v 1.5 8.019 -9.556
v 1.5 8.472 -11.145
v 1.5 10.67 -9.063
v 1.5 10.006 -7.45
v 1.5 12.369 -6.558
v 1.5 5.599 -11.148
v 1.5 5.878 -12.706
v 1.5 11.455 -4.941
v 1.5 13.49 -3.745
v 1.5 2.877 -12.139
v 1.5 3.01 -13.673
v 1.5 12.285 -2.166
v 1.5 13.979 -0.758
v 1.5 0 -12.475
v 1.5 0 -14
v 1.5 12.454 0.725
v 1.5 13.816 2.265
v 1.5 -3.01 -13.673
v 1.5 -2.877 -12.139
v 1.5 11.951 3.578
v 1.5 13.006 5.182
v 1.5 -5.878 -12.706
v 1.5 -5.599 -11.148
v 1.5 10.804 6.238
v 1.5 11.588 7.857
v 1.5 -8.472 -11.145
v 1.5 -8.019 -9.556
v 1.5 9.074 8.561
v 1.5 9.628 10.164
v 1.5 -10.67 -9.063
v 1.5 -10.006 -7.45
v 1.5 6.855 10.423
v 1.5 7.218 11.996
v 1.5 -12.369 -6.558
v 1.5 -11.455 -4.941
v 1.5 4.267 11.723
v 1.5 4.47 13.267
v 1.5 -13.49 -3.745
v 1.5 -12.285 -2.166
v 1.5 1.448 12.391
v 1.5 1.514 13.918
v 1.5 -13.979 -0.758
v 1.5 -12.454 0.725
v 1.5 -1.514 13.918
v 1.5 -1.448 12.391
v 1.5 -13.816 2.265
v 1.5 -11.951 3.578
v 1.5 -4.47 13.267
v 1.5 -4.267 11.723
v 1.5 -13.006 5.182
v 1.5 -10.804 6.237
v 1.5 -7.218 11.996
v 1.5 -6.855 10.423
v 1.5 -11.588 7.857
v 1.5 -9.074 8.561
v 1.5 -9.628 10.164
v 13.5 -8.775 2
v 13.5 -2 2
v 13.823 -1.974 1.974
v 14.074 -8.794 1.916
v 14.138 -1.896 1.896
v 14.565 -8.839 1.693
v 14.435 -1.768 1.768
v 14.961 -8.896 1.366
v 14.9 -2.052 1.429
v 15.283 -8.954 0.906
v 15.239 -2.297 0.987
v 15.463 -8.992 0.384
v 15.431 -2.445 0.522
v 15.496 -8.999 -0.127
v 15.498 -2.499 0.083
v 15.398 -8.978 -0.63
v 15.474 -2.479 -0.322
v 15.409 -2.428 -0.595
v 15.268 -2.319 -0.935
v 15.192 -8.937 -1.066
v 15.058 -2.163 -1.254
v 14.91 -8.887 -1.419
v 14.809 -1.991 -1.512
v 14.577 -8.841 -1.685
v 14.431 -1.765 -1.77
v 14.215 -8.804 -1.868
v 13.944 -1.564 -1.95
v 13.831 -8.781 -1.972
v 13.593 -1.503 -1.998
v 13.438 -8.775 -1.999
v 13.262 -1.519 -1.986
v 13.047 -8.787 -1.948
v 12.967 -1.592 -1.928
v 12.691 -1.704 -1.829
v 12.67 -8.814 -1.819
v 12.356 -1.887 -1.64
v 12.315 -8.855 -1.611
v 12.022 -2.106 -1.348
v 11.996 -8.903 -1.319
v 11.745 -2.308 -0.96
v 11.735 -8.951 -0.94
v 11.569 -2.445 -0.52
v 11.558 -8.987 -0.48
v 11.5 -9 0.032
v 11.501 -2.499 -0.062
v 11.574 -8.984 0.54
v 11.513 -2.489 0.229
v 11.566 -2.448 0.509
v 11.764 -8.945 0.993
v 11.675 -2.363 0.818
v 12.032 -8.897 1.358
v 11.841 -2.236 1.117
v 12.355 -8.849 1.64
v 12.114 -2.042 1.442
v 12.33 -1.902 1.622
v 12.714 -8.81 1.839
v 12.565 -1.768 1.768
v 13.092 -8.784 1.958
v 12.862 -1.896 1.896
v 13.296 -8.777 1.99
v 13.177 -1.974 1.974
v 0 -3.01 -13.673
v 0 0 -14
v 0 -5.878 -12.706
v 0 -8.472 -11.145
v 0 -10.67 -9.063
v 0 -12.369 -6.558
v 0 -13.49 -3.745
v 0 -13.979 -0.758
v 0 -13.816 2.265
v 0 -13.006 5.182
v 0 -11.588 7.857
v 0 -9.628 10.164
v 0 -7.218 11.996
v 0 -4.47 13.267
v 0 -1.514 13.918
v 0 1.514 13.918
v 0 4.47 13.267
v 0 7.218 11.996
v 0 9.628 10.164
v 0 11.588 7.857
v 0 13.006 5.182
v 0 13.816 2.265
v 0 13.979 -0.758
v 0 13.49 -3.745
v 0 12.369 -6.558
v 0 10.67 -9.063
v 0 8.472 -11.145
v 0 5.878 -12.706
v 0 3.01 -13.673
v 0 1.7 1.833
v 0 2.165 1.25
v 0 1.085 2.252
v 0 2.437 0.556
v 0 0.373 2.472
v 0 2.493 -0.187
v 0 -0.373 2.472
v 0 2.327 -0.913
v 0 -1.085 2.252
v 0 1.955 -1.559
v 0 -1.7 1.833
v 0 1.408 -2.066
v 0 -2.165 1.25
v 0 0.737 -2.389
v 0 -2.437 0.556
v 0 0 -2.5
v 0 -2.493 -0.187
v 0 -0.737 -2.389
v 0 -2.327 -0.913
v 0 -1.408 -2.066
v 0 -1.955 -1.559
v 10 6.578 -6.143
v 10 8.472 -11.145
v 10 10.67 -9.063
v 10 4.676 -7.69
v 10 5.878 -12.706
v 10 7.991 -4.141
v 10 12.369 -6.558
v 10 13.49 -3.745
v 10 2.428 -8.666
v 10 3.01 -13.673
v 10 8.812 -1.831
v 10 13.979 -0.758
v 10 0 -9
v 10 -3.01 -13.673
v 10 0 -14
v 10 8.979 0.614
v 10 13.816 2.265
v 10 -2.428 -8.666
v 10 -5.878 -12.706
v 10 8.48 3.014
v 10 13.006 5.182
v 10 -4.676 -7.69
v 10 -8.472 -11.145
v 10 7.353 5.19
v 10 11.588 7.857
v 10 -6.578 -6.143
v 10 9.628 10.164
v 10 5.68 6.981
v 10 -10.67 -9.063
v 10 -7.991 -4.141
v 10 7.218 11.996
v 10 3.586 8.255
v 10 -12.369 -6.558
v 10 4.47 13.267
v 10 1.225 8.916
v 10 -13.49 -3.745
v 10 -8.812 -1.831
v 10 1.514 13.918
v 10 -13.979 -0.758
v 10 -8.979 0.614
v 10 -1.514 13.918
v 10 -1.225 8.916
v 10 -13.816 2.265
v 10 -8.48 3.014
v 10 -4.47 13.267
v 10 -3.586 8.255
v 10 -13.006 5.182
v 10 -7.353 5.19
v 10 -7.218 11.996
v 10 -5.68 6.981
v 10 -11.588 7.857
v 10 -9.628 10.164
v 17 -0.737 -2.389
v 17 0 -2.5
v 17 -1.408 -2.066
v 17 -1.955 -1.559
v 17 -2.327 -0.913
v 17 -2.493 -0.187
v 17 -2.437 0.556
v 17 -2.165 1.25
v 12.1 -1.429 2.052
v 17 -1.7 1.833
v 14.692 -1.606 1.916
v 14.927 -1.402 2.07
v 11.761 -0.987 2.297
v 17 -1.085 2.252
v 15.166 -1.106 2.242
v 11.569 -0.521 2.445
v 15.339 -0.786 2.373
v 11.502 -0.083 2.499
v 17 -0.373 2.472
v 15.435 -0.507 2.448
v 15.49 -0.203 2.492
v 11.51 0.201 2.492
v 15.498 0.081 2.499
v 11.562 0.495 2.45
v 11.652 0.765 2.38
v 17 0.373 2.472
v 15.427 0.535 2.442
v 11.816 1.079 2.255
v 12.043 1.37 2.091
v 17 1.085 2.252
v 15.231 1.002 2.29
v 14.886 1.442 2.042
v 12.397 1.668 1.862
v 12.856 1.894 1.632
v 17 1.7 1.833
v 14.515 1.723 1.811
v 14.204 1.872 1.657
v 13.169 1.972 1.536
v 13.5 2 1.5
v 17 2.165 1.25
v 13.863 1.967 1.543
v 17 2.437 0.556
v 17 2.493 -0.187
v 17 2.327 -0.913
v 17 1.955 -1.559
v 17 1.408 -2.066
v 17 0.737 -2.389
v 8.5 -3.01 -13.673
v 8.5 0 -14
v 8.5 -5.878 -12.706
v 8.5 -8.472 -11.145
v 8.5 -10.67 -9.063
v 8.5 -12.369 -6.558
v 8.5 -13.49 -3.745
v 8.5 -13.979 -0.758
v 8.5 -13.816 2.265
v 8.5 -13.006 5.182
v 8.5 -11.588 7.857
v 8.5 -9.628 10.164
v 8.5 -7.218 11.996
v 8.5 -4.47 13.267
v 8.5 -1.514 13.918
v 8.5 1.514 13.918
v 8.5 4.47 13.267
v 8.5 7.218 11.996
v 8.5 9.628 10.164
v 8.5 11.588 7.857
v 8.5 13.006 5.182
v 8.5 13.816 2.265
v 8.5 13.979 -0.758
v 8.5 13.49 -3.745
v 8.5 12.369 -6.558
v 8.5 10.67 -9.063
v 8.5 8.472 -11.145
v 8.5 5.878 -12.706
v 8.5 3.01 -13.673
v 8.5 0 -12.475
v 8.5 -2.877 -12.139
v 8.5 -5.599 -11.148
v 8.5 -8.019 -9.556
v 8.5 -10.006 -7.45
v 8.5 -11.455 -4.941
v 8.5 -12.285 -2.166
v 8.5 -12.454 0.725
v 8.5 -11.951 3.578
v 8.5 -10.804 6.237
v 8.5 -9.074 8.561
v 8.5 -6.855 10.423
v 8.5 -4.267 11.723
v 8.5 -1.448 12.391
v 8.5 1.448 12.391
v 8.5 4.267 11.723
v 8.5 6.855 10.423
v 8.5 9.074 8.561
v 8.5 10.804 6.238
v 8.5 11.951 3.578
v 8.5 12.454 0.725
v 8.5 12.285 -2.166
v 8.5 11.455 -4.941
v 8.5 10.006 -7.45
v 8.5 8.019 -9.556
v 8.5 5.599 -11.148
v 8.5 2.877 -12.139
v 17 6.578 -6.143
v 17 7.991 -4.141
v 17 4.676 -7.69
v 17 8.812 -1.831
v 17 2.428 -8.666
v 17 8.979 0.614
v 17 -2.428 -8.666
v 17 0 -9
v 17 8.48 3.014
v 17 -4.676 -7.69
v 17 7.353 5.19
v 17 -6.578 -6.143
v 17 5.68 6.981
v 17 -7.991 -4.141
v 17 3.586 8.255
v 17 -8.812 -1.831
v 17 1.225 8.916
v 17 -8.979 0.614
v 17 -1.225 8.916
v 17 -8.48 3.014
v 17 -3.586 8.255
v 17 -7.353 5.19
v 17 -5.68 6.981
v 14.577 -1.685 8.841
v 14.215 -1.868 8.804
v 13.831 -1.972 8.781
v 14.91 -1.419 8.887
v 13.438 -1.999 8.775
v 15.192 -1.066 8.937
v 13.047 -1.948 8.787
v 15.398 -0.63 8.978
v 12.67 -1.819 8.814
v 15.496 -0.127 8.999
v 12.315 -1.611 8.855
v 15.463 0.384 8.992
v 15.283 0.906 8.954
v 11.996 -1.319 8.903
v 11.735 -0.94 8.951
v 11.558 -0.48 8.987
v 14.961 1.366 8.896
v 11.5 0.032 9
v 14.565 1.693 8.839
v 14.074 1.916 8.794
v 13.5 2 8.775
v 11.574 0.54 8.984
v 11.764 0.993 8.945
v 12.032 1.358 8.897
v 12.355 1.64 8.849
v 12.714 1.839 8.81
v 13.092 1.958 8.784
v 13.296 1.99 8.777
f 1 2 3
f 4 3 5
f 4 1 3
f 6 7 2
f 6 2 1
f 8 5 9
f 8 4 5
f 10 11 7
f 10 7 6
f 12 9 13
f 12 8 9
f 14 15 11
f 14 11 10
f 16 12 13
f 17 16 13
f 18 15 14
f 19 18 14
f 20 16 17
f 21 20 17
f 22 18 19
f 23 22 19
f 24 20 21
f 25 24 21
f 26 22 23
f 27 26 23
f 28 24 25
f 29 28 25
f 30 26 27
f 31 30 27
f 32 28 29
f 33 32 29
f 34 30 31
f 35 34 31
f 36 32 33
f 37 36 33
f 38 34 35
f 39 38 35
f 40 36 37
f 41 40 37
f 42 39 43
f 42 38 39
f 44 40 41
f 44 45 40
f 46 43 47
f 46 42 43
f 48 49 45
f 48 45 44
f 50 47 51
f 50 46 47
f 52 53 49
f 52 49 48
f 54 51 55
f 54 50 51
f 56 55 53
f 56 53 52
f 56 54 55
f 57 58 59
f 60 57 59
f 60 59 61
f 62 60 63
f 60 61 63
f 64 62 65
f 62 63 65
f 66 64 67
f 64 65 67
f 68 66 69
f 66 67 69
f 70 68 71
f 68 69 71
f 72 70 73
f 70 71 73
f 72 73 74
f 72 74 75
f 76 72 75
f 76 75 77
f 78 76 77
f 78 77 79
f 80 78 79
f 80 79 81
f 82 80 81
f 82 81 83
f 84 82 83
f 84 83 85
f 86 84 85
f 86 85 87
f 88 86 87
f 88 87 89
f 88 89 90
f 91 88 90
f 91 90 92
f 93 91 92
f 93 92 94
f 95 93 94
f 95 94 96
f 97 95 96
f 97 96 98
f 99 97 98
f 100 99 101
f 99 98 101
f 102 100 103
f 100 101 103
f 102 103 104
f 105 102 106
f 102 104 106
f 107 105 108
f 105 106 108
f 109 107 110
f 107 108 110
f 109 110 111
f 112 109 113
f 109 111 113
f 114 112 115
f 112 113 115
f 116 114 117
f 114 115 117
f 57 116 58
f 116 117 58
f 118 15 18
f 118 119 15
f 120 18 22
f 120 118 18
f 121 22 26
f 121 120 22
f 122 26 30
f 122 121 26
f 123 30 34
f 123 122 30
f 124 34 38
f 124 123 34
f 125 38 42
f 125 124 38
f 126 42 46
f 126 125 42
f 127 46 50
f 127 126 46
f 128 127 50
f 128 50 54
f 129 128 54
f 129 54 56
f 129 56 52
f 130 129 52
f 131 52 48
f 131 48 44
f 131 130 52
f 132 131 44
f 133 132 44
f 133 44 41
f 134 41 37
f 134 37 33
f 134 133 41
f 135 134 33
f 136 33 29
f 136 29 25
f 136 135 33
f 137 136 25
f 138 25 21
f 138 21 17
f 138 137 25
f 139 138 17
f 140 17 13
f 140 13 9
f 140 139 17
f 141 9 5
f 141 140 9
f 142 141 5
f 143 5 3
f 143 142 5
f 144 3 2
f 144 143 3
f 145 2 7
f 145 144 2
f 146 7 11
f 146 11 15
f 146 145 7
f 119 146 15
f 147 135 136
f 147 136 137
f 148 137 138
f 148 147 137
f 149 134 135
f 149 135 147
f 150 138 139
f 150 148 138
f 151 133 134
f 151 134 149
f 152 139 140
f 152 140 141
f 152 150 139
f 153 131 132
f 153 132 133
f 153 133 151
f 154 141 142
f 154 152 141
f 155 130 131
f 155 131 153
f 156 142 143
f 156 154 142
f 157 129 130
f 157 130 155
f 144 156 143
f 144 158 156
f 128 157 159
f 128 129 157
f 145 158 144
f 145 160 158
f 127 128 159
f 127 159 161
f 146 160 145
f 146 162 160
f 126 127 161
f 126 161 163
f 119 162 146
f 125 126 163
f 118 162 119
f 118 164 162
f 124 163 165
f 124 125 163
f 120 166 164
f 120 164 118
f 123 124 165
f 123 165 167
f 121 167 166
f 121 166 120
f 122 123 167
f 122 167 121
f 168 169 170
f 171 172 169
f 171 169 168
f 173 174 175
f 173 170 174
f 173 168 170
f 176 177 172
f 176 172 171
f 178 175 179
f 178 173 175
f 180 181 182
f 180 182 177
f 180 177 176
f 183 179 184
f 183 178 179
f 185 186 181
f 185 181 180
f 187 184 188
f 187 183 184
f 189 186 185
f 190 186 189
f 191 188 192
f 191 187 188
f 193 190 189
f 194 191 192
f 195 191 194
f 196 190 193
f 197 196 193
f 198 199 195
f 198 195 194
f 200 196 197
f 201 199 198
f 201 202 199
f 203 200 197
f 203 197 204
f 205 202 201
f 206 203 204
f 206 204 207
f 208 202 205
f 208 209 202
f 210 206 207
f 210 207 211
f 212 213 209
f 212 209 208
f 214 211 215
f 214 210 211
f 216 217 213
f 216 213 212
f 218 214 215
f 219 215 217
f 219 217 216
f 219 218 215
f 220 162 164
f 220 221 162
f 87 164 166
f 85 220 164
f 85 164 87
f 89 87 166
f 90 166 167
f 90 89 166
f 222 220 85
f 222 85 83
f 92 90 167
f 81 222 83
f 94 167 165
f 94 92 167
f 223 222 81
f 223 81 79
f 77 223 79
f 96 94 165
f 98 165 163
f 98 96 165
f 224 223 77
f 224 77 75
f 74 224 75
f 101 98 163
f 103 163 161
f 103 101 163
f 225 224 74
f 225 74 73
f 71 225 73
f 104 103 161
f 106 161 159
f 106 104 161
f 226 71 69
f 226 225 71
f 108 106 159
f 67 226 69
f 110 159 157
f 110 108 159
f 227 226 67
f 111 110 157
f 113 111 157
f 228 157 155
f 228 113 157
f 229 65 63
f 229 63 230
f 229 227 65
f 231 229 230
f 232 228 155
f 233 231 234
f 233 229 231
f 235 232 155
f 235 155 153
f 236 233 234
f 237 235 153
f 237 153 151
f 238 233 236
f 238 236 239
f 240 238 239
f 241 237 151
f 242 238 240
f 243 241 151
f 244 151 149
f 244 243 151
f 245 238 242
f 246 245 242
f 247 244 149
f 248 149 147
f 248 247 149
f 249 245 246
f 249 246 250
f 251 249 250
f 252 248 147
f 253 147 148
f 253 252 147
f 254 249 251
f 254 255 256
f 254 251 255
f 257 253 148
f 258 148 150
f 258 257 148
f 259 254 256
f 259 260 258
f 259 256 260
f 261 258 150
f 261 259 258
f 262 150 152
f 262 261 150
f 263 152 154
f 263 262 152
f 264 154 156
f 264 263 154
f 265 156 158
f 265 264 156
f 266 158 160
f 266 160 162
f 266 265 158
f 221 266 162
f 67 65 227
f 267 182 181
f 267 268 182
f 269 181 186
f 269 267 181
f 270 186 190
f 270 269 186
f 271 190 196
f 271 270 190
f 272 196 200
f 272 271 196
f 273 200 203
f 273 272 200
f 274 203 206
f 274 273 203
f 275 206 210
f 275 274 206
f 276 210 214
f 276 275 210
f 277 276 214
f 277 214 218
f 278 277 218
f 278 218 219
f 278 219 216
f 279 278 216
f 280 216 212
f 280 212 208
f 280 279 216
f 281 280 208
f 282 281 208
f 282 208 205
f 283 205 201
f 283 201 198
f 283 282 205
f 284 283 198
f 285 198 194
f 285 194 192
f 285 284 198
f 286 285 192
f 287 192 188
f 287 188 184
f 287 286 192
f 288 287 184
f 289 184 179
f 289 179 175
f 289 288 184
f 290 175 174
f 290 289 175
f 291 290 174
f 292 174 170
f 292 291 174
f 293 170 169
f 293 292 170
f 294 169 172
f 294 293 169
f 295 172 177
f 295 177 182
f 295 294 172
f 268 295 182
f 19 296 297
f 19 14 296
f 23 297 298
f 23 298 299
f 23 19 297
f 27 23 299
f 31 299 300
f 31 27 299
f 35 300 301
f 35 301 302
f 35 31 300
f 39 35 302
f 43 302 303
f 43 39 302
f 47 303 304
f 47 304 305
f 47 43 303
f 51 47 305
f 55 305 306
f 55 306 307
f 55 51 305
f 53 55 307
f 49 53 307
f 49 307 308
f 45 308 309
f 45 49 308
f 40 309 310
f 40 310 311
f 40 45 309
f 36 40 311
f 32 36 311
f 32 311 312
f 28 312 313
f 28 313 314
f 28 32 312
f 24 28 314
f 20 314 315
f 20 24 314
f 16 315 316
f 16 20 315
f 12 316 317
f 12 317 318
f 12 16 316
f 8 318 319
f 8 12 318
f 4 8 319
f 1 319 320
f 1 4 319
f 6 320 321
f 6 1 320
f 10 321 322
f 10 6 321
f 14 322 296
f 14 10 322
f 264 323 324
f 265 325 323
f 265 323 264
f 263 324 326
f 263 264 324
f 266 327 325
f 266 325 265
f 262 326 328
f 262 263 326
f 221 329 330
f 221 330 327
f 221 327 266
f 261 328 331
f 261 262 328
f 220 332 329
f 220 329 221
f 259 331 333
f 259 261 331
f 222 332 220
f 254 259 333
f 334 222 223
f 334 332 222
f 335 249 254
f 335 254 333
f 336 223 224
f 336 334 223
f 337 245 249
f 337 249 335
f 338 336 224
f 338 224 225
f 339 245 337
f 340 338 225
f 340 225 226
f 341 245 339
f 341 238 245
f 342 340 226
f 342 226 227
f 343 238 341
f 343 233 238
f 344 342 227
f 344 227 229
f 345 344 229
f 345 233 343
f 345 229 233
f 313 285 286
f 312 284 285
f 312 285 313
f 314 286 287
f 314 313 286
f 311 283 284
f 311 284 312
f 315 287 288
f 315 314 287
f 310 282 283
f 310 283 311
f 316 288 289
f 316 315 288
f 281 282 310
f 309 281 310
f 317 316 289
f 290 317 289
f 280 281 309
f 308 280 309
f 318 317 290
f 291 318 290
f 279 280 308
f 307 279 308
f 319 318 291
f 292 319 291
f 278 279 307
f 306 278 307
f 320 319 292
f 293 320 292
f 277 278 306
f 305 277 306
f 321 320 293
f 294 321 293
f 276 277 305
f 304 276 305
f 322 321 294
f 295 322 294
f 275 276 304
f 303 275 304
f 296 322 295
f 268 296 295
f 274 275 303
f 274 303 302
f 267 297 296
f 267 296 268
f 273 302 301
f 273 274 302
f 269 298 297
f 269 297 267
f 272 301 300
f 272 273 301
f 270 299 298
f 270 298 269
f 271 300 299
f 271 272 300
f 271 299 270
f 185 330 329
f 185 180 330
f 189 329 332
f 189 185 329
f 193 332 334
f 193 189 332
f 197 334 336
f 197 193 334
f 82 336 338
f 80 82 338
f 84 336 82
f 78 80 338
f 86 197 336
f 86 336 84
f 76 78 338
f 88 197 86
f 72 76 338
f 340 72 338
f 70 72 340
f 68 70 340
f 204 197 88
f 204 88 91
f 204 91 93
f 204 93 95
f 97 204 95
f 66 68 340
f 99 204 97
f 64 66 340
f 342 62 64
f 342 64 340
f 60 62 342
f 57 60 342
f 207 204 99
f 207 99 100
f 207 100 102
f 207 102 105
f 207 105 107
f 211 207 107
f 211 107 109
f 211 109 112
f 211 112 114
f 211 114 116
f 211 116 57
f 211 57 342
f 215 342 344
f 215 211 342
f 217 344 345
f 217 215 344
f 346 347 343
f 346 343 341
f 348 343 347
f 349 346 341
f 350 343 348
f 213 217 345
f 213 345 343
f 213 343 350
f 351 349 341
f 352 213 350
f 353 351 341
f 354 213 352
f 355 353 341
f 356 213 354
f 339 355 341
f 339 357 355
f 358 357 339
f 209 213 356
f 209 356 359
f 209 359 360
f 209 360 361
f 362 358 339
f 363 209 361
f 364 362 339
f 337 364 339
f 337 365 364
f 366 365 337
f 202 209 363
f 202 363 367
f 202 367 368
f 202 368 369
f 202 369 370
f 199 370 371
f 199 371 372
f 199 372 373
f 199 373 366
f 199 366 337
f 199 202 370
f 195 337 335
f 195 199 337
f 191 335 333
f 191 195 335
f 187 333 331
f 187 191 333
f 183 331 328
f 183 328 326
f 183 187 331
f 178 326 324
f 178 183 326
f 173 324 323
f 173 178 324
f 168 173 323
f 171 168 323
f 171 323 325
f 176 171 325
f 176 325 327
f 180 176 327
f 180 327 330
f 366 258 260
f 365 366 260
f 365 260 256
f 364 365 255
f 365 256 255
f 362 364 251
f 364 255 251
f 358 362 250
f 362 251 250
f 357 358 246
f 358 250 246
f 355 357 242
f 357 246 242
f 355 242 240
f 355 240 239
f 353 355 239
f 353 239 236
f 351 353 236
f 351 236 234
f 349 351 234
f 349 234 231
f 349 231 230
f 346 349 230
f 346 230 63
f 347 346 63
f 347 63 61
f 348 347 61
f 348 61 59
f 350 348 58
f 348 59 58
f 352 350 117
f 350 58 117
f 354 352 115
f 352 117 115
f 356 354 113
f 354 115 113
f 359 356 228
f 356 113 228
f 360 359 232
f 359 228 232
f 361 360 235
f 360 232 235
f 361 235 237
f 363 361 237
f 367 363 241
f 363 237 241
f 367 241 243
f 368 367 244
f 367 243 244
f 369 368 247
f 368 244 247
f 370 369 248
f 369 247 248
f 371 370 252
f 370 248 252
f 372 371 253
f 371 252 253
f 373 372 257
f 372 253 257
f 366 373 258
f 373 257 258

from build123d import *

# Parameters (mm, degrees)
CUT_EXTRUDE1_REACH      = 28.096
CUT_EXTRUDE1_END_RADIUS = 9
SKETCH2_R               = 2
CIRPATTERN1_COUNT       = 2
CIRPATTERN1_ANGLE       = 90


with BuildPart() as part:
    # Sketch1 → Revolve1 (revolve)
    with BuildSketch(Plane.XY, mode=Mode.PRIVATE) as revolve1_sk:
        Polygon((0, 2.5), (17, 2.5), (17, 9), (10, 9), (10, 14), (8.5, 14), (8.5, 12.475), (1.5, 12.475), (1.5, 14), (0, 14), align=None)
    revolve(revolve1_sk.sketch.rotate(Axis((17.85, 0, 0), (-1, 0, 0)), 90), axis=Axis((17.85, 0, 0), (-1, 0, 0)))

    # Cut-Extrude1: up to this cylinder (the profile starts inside it)
    cut_extrude1_end = Plane(origin=(13.5, 0, 0), z_dir=(1, 0, 0)) * Cylinder(CUT_EXTRUDE1_END_RADIUS, 75.192, mode=Mode.PRIVATE)
    # Sketch2 → Cut-Extrude1 (cut, up to the surface)
    with BuildSketch(Plane(origin=(0, 0, 0), x_dir=(1, 0, 0), z_dir=(0, 1, 0)), mode=Mode.PRIVATE) as cut_extrude1_sk1:
        with Locations(Location((13.5, 0, 0), (0, 0, 270))):
            Circle(SKETCH2_R)
    cut_extrude1_tool1 = extrude(cut_extrude1_sk1.sketch, amount=-CUT_EXTRUDE1_REACH, mode=Mode.PRIVATE) & cut_extrude1_end
    cut_extrude1 = cut_extrude1_tool1.solids().sort_by_distance((13.5, 0, 0))[0]
    add(cut_extrude1, mode=Mode.SUBTRACT)

    # CirPattern1: Cut-Extrude1 ×2 about axis
    cirpattern1_axis = Axis((17.85, 0, 0), (-1, 0, 0))
    for i in range(1, CIRPATTERN1_COUNT):
        add(cut_extrude1.rotate(cirpattern1_axis, i * CIRPATTERN1_ANGLE / (CIRPATTERN1_COUNT - 1)), mode=Mode.SUBTRACT)


solid = part.part
